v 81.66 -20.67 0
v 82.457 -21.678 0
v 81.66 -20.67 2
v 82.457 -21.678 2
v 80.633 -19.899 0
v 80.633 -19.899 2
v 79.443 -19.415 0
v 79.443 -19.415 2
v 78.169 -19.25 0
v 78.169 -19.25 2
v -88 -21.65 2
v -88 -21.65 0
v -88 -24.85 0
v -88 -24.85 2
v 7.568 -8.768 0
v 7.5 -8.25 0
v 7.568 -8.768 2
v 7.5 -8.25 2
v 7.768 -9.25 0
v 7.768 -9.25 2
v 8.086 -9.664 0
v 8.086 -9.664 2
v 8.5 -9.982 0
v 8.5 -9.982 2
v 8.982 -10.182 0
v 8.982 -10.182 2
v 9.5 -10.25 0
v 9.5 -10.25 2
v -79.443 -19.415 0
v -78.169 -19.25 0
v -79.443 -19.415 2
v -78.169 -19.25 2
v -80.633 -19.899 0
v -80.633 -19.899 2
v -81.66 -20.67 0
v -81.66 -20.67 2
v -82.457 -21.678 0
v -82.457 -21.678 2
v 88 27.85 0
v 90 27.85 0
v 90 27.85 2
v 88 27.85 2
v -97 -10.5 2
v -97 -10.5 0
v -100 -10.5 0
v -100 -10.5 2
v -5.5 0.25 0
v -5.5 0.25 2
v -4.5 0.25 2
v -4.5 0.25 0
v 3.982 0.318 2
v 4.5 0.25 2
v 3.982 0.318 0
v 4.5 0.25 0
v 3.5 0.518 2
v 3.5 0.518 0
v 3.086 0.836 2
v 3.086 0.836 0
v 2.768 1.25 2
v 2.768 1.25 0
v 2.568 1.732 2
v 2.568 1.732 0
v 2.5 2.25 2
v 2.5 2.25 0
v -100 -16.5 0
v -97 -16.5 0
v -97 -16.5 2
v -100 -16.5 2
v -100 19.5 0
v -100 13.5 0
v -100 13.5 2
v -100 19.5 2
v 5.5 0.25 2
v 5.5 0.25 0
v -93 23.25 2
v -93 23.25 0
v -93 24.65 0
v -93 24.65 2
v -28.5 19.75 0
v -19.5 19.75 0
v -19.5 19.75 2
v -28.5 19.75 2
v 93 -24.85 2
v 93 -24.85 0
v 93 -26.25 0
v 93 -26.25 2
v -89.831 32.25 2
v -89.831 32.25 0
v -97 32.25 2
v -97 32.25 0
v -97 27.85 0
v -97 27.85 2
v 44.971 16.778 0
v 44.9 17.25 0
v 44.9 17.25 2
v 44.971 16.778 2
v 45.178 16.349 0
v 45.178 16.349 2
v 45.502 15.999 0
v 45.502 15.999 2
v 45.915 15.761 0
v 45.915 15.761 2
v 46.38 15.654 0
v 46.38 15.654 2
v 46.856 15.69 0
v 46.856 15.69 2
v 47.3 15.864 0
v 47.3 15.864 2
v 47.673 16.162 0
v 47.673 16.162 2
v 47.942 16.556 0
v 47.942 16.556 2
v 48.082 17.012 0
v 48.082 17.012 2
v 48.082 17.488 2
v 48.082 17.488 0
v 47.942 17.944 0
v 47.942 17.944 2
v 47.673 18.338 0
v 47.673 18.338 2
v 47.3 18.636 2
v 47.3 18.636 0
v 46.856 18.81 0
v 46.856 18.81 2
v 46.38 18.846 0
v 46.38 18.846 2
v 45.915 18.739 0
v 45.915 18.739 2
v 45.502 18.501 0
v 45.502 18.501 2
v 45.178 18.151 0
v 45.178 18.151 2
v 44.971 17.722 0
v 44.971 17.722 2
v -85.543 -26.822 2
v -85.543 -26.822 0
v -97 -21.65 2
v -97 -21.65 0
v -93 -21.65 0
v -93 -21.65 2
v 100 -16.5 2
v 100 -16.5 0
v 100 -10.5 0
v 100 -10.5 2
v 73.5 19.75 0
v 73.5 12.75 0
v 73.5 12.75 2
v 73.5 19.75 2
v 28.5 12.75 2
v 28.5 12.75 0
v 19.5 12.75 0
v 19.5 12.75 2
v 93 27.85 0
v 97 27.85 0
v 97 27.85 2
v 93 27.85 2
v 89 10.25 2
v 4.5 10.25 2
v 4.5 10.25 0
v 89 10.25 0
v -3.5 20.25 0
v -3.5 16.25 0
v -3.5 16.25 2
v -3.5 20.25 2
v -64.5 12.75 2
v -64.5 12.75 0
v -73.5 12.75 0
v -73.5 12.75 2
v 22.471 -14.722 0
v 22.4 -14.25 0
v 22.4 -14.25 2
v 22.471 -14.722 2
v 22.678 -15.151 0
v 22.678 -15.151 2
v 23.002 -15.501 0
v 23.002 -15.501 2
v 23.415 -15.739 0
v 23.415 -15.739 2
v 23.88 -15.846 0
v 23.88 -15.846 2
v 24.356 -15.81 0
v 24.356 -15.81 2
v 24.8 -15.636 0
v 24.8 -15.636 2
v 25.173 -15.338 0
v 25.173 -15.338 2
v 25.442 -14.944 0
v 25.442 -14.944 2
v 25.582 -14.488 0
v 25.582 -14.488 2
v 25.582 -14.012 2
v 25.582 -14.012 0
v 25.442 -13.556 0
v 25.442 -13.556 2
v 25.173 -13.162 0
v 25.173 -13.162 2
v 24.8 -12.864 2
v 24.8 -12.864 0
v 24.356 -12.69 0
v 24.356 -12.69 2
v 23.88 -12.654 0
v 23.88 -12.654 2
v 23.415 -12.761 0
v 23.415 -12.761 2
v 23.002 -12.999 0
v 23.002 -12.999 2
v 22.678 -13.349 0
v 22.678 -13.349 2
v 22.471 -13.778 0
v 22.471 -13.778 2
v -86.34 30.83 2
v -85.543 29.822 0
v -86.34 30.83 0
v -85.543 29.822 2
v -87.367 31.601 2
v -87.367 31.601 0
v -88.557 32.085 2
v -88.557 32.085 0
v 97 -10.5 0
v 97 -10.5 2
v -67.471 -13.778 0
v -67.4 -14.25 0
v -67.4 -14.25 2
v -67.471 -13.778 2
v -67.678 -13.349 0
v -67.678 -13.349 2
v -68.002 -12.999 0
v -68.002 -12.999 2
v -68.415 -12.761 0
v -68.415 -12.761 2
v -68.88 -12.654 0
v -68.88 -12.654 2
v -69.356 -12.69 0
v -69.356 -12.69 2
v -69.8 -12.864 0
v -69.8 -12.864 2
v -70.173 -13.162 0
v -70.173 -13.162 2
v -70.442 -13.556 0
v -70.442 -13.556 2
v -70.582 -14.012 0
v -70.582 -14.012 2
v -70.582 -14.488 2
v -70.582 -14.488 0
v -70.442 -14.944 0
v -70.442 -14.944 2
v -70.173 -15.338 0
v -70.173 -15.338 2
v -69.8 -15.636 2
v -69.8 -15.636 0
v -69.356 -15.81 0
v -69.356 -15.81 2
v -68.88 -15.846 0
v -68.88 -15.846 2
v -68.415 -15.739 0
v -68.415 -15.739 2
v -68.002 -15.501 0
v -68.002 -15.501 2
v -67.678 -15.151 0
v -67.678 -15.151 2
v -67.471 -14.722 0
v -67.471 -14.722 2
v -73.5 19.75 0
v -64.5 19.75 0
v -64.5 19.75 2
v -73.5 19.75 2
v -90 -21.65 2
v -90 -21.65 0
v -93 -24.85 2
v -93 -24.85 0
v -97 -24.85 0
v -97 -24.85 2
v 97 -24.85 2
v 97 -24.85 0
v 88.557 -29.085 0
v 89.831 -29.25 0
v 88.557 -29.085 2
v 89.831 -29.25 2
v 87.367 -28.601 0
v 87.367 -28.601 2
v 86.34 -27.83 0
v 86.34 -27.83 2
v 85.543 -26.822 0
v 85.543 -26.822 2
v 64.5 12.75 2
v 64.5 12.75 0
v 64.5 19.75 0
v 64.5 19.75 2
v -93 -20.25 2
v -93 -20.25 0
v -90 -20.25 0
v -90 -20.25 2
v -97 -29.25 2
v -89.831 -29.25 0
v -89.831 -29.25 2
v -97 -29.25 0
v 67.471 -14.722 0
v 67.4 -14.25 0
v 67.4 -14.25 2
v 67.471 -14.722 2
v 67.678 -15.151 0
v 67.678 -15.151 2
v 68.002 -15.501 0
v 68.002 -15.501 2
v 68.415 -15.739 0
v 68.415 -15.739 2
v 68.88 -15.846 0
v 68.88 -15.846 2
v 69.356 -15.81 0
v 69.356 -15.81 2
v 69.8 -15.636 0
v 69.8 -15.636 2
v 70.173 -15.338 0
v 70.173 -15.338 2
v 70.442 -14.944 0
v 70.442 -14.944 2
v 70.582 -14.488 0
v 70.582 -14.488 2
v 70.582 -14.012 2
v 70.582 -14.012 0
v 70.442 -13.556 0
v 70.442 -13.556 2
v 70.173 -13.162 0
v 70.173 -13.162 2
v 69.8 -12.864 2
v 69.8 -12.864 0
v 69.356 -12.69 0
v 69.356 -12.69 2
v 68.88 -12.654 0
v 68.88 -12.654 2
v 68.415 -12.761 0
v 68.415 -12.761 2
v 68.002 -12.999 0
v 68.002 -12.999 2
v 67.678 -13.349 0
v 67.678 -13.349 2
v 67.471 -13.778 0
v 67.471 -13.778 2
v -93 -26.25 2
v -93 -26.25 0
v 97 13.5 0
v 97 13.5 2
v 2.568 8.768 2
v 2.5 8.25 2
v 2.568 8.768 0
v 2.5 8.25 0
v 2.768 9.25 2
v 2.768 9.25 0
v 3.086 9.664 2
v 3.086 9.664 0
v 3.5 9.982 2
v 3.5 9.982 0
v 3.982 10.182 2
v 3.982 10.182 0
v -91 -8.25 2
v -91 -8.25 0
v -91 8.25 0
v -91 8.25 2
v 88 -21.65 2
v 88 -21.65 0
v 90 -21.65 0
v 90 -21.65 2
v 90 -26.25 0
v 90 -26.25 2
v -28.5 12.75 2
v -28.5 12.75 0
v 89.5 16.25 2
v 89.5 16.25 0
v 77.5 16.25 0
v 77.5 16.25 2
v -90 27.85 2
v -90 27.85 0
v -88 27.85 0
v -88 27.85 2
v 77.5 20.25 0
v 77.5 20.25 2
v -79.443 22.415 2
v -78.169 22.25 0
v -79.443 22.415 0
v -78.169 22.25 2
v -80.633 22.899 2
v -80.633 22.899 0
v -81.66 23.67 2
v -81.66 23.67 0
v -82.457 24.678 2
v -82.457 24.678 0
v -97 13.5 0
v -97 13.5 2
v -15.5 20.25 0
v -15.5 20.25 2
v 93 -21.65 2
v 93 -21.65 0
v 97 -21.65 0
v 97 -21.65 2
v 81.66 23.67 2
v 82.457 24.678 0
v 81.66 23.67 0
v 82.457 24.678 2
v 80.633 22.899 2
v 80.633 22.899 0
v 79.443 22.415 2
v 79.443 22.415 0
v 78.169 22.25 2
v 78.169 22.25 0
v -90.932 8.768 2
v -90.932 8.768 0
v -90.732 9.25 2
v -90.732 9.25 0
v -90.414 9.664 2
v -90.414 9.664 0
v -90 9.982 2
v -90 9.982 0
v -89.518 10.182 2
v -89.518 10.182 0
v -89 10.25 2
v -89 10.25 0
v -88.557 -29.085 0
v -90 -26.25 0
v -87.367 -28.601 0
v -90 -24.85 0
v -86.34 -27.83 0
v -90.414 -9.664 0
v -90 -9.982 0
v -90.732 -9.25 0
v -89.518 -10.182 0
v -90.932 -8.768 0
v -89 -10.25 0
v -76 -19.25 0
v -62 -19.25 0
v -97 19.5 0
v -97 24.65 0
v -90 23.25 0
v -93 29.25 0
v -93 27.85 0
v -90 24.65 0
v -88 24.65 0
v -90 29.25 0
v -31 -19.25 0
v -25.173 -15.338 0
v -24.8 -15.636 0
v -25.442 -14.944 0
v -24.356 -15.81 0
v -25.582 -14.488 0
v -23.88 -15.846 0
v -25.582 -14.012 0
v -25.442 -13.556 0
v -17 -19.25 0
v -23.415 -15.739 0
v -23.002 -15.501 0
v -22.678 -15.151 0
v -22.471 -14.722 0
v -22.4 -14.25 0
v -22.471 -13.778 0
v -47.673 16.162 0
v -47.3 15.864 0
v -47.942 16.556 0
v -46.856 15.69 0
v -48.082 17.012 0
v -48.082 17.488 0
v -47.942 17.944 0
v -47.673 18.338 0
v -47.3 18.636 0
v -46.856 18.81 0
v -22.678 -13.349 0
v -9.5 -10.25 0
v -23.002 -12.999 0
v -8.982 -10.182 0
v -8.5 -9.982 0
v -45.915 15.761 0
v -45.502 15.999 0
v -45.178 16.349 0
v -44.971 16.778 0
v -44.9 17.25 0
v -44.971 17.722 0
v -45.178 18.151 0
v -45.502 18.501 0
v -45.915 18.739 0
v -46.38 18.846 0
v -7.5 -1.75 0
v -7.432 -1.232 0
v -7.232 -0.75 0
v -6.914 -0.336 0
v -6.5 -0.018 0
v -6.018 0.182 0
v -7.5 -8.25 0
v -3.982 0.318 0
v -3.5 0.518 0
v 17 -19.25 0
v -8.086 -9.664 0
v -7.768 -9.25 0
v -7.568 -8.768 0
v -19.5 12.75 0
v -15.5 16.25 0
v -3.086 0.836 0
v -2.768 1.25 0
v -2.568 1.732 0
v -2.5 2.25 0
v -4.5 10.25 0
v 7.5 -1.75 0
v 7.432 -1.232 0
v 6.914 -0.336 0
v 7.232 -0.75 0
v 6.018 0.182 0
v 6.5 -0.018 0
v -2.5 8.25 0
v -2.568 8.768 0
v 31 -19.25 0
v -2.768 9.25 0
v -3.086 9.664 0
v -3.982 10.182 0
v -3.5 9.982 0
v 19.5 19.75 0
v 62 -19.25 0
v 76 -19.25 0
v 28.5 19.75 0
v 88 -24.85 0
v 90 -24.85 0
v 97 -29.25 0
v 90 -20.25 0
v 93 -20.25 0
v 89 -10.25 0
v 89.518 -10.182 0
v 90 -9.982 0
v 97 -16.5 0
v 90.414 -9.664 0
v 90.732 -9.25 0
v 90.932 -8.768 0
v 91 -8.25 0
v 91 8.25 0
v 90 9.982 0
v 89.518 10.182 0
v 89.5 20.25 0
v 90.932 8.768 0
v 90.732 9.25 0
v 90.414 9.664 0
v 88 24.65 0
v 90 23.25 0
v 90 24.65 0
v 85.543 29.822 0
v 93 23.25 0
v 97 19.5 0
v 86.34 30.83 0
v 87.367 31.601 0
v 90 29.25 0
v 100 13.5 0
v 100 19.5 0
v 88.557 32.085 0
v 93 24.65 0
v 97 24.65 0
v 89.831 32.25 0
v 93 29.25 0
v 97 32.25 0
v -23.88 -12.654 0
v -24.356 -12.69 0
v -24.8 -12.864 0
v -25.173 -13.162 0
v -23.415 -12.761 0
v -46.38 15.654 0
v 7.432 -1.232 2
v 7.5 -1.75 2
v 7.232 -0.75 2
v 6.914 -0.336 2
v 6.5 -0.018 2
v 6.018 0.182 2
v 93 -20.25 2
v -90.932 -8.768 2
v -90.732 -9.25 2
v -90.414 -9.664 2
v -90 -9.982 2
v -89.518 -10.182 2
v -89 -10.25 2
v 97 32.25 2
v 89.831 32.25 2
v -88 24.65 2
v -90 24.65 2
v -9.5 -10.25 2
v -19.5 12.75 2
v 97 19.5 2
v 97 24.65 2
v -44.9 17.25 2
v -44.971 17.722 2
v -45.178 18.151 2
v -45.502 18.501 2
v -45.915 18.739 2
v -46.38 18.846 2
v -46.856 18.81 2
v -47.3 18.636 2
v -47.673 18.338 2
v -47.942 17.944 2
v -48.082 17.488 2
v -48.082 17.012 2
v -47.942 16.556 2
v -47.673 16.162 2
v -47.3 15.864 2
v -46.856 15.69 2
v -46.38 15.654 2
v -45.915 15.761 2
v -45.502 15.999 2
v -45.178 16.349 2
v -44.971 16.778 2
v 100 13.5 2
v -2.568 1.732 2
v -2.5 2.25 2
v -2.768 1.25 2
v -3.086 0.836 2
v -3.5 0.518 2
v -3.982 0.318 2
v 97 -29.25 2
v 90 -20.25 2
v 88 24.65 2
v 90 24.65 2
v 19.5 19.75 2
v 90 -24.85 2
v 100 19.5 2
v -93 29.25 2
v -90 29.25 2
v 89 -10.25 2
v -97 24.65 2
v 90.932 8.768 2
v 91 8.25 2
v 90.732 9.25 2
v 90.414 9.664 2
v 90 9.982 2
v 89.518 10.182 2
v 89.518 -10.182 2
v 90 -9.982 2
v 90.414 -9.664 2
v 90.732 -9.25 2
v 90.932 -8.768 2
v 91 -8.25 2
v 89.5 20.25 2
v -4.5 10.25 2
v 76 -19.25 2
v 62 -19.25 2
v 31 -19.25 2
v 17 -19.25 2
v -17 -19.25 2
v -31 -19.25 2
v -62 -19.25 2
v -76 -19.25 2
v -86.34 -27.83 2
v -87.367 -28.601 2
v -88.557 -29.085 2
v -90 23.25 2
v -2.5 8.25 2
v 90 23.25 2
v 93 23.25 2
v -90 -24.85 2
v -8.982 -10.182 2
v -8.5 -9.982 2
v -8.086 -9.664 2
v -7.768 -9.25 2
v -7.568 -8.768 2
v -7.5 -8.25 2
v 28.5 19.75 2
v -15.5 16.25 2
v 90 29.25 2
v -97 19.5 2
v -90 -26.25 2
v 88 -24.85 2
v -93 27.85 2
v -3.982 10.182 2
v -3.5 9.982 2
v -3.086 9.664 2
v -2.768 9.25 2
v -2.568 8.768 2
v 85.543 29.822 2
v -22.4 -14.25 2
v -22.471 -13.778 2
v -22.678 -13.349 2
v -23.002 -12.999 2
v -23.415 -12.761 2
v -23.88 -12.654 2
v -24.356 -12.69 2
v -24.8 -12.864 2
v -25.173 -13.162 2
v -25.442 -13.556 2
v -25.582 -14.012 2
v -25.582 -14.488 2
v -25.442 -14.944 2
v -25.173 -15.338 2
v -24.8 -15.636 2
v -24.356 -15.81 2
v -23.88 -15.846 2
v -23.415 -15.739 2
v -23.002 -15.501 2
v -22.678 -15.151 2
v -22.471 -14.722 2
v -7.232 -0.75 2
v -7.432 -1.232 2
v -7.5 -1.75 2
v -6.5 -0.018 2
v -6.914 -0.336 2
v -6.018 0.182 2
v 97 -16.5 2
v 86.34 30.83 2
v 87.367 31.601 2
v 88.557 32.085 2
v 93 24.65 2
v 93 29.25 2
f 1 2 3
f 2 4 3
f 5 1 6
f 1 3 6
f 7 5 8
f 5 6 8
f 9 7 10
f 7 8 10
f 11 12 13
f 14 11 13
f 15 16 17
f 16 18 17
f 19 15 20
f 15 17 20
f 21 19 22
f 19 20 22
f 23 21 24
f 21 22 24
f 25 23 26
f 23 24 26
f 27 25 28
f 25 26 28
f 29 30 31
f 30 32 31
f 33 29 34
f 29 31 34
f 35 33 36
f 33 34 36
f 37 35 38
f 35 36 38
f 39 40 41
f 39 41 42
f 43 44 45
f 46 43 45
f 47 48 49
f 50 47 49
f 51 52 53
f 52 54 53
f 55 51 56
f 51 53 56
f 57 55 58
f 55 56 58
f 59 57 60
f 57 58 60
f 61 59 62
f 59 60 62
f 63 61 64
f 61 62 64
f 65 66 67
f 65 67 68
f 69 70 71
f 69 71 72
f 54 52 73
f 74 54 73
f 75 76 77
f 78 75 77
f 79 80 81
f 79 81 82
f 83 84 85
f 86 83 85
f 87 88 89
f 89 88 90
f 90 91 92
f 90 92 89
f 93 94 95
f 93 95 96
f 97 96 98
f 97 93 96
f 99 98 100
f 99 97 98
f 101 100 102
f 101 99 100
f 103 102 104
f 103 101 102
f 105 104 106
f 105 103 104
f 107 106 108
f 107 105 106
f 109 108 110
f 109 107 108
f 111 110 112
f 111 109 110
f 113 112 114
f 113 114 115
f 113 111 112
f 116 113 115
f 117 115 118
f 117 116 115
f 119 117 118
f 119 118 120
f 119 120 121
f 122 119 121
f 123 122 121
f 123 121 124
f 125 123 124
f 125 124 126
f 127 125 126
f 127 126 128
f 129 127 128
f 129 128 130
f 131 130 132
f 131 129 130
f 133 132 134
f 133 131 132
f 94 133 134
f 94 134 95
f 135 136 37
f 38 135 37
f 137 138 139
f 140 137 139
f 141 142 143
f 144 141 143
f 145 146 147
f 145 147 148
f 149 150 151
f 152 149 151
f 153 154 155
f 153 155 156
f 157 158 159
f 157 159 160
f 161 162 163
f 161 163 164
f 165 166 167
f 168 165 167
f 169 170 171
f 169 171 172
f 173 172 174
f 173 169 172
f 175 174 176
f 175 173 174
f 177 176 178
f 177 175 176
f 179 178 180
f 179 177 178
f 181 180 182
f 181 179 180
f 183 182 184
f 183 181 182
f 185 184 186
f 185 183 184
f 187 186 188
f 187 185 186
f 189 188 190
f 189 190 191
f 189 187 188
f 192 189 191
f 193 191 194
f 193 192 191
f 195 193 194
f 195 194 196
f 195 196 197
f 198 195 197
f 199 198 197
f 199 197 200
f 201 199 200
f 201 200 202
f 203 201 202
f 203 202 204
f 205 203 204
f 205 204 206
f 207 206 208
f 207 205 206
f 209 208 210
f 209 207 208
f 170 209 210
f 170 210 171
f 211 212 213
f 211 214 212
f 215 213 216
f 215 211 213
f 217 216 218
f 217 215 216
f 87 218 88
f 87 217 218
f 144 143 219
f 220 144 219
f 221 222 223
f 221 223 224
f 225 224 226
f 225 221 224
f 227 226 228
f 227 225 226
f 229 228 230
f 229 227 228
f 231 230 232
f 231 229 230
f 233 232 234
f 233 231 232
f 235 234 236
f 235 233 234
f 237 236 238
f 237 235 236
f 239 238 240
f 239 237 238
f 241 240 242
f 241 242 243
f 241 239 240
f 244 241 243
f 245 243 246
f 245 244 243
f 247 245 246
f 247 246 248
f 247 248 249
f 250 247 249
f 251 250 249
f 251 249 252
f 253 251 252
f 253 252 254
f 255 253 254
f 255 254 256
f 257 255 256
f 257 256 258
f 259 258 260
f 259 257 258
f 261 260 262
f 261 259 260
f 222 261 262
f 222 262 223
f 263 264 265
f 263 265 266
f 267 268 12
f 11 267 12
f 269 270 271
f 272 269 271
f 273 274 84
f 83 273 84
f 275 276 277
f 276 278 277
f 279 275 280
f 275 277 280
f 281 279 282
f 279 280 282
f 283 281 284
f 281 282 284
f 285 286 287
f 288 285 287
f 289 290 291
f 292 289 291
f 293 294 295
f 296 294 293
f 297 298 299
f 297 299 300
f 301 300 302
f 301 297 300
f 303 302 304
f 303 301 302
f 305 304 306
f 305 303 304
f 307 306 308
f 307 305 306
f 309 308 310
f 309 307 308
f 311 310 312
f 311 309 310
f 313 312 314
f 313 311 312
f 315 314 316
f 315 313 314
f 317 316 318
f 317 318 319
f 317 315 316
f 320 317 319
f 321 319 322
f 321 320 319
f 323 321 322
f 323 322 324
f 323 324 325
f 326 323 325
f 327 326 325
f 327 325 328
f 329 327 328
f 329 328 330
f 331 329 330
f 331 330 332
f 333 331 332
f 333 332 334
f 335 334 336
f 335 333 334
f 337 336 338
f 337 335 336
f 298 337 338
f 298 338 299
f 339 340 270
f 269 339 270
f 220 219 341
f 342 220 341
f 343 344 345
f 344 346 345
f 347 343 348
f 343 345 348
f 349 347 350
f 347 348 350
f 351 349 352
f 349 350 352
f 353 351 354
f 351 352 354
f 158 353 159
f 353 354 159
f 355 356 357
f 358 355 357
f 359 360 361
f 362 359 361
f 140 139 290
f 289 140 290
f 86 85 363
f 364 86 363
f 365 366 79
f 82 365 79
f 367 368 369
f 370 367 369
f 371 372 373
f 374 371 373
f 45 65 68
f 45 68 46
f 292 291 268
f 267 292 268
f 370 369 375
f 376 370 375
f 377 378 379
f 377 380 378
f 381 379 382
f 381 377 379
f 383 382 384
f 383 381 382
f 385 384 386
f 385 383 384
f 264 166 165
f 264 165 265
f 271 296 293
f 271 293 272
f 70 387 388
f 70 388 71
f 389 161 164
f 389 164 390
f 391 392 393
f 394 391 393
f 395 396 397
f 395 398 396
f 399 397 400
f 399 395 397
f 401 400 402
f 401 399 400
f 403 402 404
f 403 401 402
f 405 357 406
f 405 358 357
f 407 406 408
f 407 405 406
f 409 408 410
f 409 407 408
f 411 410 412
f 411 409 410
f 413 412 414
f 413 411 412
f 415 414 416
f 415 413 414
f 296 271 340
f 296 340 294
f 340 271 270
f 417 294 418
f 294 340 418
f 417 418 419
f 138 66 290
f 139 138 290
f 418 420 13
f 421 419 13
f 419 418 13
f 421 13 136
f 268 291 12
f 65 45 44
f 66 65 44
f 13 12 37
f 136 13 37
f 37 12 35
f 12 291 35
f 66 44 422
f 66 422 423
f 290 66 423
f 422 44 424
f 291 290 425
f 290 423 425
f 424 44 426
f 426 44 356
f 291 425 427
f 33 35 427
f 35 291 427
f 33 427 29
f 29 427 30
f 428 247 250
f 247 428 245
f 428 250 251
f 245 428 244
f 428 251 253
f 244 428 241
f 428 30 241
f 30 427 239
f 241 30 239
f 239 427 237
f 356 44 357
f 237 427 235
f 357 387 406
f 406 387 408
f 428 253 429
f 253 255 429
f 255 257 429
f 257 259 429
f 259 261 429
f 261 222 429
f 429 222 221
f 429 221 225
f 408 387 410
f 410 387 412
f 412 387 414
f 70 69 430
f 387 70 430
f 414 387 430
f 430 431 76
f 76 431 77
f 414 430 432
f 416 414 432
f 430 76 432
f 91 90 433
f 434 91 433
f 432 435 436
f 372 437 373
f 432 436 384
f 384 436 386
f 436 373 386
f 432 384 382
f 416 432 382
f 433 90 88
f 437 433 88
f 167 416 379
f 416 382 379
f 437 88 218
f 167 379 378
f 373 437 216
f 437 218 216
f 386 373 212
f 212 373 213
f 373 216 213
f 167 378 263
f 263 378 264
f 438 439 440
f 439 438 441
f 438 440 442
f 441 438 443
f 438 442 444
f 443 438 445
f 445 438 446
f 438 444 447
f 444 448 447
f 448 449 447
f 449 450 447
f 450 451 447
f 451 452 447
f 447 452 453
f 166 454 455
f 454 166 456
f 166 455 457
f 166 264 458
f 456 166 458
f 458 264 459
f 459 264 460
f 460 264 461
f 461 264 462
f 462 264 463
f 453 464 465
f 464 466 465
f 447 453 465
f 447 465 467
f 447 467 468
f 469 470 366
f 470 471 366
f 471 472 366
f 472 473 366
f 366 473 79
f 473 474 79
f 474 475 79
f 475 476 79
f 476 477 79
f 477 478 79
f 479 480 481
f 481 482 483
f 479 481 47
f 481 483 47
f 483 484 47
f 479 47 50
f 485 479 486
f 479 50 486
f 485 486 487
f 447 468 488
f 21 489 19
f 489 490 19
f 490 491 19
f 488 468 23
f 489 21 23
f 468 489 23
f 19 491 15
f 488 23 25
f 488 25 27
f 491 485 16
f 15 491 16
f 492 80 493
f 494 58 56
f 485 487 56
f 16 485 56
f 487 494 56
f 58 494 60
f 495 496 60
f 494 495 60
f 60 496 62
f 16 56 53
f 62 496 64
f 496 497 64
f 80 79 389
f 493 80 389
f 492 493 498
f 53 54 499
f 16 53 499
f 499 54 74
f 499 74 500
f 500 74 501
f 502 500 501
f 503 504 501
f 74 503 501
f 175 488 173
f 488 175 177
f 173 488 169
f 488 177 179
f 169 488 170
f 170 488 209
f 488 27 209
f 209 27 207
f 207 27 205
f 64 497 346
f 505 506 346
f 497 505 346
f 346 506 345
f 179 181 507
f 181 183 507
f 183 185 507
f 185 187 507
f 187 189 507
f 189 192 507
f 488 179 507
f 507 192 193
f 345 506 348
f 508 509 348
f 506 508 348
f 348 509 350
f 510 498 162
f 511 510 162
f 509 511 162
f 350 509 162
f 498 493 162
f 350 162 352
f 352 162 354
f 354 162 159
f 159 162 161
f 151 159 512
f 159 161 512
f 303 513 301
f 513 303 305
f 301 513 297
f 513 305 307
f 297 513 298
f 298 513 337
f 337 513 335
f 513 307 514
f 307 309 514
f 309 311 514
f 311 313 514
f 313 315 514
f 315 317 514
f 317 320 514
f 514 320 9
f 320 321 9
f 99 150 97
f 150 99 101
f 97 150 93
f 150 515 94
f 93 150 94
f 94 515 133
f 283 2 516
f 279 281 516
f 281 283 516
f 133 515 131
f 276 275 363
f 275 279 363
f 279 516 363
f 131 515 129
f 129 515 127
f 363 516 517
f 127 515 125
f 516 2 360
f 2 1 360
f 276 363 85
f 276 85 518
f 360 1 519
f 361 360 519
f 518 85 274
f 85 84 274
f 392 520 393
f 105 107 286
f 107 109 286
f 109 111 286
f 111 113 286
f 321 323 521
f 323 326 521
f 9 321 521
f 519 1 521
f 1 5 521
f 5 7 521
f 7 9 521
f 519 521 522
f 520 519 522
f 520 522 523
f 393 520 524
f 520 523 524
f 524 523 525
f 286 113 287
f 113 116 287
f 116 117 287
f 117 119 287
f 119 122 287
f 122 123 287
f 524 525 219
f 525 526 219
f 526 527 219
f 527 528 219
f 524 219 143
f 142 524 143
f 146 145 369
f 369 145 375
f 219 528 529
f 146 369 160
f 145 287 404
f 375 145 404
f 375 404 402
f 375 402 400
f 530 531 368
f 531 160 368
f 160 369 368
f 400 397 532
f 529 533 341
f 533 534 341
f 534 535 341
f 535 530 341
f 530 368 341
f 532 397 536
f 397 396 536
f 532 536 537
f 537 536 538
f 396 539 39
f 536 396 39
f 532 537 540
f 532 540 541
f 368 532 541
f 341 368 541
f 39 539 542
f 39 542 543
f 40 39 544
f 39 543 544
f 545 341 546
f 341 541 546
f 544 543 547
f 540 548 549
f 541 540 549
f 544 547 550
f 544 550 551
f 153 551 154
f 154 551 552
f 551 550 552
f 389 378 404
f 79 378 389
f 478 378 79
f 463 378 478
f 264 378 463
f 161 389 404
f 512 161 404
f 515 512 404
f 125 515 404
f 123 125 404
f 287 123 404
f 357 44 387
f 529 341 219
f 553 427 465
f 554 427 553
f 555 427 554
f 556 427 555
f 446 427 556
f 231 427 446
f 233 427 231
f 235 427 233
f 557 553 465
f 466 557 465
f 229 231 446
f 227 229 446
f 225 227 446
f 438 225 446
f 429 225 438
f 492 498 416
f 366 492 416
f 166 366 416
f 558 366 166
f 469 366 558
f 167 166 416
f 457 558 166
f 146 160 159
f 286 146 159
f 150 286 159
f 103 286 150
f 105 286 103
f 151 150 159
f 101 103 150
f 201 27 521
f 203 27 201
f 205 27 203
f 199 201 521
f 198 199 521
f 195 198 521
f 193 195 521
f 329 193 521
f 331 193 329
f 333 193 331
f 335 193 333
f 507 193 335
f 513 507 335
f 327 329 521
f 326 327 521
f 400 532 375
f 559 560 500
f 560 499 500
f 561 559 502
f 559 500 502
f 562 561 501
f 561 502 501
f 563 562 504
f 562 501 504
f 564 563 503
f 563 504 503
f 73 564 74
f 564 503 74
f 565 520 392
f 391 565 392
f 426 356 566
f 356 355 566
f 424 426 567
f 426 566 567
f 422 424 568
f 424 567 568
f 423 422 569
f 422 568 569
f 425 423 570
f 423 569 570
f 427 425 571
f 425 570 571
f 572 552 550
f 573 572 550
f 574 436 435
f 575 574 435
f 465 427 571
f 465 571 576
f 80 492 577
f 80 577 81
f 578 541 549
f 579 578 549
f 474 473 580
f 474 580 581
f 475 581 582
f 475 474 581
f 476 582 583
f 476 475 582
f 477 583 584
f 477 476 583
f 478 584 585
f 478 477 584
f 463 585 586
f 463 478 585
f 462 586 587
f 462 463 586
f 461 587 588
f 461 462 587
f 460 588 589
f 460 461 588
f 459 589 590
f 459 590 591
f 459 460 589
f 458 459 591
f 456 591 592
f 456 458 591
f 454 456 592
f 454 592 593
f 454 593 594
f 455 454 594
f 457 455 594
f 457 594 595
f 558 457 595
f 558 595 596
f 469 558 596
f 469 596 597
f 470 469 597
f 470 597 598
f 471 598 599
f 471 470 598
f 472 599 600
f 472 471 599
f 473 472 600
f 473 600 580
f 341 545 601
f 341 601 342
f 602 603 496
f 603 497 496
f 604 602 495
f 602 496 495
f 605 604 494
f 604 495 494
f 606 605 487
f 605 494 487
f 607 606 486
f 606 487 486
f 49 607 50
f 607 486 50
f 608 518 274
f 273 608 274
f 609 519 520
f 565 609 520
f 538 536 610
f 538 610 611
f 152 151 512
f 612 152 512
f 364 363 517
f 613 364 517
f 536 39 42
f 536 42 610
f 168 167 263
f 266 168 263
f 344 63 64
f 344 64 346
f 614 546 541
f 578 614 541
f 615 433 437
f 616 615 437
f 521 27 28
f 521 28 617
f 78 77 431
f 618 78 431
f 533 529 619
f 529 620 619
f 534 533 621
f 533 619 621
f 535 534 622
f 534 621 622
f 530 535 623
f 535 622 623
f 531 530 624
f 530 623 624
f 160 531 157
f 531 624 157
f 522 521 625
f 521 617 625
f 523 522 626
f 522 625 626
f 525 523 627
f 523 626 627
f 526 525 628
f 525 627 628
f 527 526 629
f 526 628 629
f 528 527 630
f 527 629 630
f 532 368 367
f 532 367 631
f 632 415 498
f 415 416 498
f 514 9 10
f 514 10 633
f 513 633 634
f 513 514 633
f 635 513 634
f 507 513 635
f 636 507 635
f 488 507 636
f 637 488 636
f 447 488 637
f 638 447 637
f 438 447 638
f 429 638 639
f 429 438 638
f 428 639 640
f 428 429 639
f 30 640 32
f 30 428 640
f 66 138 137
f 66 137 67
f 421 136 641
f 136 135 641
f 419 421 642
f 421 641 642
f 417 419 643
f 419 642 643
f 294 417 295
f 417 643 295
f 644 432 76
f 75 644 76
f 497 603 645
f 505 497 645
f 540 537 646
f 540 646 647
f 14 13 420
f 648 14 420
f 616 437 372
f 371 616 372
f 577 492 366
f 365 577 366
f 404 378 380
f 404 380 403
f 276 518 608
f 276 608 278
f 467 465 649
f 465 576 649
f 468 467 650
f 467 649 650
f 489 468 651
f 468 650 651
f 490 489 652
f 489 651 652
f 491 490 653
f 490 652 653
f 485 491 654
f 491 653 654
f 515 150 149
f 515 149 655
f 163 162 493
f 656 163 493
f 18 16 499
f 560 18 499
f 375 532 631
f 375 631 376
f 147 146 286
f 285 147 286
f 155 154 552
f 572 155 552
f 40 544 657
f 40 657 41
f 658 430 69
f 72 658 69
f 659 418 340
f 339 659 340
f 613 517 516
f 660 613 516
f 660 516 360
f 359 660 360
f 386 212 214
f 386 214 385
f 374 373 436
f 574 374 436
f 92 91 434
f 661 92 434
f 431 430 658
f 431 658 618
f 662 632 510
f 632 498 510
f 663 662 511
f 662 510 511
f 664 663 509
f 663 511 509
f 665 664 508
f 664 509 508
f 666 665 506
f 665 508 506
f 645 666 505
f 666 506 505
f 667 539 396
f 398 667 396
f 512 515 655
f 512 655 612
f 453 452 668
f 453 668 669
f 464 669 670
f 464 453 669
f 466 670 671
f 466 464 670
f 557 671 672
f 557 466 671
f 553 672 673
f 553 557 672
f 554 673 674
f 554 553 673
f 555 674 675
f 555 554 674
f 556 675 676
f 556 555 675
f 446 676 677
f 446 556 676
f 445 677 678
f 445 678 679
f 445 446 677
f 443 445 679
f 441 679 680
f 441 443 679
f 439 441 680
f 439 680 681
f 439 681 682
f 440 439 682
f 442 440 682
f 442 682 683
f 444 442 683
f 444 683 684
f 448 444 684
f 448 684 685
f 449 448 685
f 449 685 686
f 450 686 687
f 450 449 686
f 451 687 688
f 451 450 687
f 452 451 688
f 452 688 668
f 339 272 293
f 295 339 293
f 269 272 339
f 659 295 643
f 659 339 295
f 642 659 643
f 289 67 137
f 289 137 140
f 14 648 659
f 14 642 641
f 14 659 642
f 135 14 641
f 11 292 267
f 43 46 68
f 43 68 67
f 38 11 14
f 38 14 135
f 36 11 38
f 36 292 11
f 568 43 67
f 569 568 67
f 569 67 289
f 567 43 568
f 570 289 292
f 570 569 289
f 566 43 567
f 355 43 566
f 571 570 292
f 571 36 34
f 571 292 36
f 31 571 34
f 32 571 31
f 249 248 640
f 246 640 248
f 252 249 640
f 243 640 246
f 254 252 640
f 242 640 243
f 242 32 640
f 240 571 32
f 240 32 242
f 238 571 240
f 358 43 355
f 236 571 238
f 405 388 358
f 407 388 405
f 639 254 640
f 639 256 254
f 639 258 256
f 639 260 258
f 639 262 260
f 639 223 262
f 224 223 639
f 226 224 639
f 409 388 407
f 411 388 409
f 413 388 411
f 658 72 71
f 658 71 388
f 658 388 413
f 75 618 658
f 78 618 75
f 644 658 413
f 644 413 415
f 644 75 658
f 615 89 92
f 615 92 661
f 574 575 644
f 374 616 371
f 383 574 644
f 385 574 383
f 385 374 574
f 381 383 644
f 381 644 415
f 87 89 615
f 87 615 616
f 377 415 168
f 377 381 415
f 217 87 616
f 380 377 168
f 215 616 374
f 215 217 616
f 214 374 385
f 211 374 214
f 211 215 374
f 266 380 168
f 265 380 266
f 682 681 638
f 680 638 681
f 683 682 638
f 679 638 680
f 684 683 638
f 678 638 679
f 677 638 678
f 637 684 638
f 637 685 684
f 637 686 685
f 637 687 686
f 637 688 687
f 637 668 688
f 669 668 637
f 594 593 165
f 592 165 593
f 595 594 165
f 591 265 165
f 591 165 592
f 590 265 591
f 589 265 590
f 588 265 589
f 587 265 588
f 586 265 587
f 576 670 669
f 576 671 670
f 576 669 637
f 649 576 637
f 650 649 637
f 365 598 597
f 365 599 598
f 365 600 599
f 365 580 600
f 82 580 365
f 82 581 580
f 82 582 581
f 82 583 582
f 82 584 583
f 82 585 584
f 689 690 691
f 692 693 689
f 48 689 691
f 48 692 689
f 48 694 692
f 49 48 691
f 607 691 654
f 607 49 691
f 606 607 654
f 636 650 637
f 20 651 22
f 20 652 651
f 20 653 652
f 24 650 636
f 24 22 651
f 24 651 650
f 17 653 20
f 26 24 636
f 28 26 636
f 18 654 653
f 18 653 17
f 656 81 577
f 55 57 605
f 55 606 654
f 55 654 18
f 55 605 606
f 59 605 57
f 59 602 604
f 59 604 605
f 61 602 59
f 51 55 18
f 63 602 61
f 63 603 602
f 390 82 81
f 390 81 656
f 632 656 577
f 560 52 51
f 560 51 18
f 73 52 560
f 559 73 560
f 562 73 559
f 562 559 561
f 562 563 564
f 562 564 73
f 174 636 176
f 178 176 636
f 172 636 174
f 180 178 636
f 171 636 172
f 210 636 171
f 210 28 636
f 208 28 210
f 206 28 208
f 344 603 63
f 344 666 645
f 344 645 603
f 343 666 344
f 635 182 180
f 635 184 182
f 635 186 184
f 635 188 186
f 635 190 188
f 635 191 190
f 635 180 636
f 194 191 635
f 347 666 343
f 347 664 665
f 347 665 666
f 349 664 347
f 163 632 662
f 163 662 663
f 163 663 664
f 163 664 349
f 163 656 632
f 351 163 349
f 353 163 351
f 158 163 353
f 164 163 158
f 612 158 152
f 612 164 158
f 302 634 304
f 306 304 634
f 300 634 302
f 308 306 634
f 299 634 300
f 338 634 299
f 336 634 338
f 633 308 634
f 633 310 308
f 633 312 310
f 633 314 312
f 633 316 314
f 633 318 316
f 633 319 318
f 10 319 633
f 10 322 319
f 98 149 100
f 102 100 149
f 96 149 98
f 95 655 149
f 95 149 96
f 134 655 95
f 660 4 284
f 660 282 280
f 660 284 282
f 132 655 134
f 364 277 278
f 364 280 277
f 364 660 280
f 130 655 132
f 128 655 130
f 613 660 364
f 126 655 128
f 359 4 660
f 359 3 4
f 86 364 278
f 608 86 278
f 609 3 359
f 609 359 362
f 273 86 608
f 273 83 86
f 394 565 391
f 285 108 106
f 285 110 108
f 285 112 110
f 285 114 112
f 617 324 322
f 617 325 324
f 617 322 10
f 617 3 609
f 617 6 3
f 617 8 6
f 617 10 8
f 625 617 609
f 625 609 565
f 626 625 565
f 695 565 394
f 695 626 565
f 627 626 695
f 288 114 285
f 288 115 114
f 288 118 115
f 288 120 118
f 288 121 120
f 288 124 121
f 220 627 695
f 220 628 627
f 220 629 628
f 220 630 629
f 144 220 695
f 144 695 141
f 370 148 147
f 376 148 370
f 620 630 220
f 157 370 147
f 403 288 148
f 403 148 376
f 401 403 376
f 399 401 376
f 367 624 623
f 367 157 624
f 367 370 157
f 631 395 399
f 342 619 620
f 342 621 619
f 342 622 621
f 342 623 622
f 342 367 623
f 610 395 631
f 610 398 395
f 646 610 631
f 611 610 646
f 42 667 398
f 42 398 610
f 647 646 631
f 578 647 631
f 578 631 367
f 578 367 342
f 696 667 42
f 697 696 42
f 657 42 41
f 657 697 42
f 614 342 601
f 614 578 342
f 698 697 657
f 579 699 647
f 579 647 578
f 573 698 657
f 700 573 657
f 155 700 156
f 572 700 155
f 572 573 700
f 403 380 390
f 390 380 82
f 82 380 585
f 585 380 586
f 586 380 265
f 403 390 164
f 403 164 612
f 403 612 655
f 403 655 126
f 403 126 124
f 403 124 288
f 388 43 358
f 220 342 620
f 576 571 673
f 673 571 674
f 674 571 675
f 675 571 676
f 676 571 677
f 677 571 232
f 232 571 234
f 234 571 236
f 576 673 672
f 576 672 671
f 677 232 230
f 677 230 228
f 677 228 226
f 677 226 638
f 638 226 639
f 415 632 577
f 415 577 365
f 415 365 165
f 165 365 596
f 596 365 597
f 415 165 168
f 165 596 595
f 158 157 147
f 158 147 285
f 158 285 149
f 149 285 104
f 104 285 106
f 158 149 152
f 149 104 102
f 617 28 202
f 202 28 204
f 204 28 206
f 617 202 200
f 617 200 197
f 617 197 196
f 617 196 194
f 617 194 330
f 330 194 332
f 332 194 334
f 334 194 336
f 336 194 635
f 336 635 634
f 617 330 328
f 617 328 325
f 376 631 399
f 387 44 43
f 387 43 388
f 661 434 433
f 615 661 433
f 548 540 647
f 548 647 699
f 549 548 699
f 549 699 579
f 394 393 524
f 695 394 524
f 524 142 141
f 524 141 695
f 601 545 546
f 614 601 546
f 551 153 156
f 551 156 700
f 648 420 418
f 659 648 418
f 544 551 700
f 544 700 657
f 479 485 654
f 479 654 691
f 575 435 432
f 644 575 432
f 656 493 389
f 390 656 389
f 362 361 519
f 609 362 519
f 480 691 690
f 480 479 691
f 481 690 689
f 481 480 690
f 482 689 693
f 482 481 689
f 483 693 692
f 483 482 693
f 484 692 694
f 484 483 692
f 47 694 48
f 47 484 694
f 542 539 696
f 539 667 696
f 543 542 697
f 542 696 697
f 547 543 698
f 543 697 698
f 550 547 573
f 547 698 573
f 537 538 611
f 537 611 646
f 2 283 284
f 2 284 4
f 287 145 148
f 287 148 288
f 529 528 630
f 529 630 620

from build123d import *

# Parameters (mm, degrees)
SKETCH_1_R          = 1.6
SKETCH_1_W          = 83.5
SKETCH_1_H          = 20.5
EXTRUDE_1_DEPTH     = 2
SKETCH_3_W          = 5
SKETCH_3_H          = 10
CUT_EXTRUDE_2_DEPTH = 101.127730924
SKETCH_4_W          = 9
SKETCH_4_H          = 7
SKETCH_4_W_2        = 23
SKETCH_4_H_2        = 5.5
SKETCH_4_W_3        = 38
CUT_EXTRUDE_3_DEPTH = 101.127730924
SKETCH_5_W          = 12
SKETCH_5_H          = 4
CUT_EXTRUDE_4_DEPTH = 101.127730924
FILLET_8_R          = 2
FILLET_9_R          = 2
SKETCH_7_W          = 10
SKETCH_7_H          = 10
EXTRUDE_3_DEPTH     = 2
SKETCH_9_W          = 162.568913239
SKETCH_9_H          = 21.283892233
CUT_EXTRUDE_5_DEPTH = 103.240219581
SKETCH_8_W          = 3
SKETCH_8_H          = 6
EXTRUDE_4_DEPTH     = 2
CUT_EXTRUDE_6_DEPTH = 106.090734606
FILLET_10_R         = 5


with BuildPart() as part:
    # 草图1 → 凸台-拉伸1 (new body)
    with BuildSketch(Plane.XY):
        Polygon((64, -19.25), (29, -19.25), (29, -24.75), (-29, -24.75), (-29, -19.25), (-64, -19.25), (-64, -24.75), (-97, -24.75), (-97, 22.25), (97, 22.25), (97, -24.75), (64, -24.75), align=None)
        with Locations((-46.5, 17.25)):
            Circle(SKETCH_1_R, mode=Mode.SUBTRACT)
        with Locations((-69, -14.25)):
            Circle(SKETCH_1_R, mode=Mode.SUBTRACT)
        with Locations((-24, -14.25)):
            Circle(SKETCH_1_R, mode=Mode.SUBTRACT)
        with Locations(Location((69, -14.25, 0), (0, 0, 180))):
            Circle(SKETCH_1_R, mode=Mode.SUBTRACT)
        with Locations(Location((46.5, 17.25, 0), (0, 0, 180))):
            Circle(SKETCH_1_R, mode=Mode.SUBTRACT)
        with Locations(Location((24, -14.25, 0), (0, 0, 180))):
            Circle(SKETCH_1_R, mode=Mode.SUBTRACT)
        with Locations((-69, -21.75)):
            Circle(SKETCH_1_R, mode=Mode.SUBTRACT)
        with Locations((-24, -21.75)):
            Circle(SKETCH_1_R, mode=Mode.SUBTRACT)
        with Locations((24, -21.75)):
            Circle(SKETCH_1_R, mode=Mode.SUBTRACT)
        with Locations((69, -21.75)):
            Circle(SKETCH_1_R, mode=Mode.SUBTRACT)
        with Locations((-49.25, 0)):
            Rectangle(SKETCH_1_W, SKETCH_1_H, mode=Mode.SUBTRACT)
        with Locations((49.25, 0)):
            Rectangle(SKETCH_1_W, SKETCH_1_H, mode=Mode.SUBTRACT)
    extrude(amount=EXTRUDE_1_DEPTH)

    # 草图3 → 切除-拉伸2 (cut, through all)
    with BuildSketch(Plane.XY.offset(2)):
        with Locations((-5, 5.25)):
            Rectangle(SKETCH_3_W, SKETCH_3_H)
        with Locations((5, 5.25)):
            Rectangle(SKETCH_3_W, SKETCH_3_H)
    extrude(amount=-CUT_EXTRUDE_2_DEPTH, mode=Mode.SUBTRACT)

    # 草图4 → 切除-拉伸3 (cut, through all)
    with BuildSketch(Plane(origin=(0, 0, 0), x_dir=(-1, 0, 0), z_dir=(0, 0, -1))):
        with Locations((-69, 16.25)):
            Rectangle(SKETCH_4_W, SKETCH_4_H)
        with Locations((-24, 16.25)):
            Rectangle(SKETCH_4_W, SKETCH_4_H)
        with Locations((24, 16.25)):
            Rectangle(SKETCH_4_W, SKETCH_4_H)
        with Locations((69, 16.25)):
            Rectangle(SKETCH_4_W, SKETCH_4_H)
        with Locations((-85.5, -22)):
            Rectangle(SKETCH_4_W_2, SKETCH_4_H_2)
        with Locations((85.5, -22)):
            Rectangle(SKETCH_4_W_2, SKETCH_4_H_2)
        with Locations((0, -22)):
            Rectangle(SKETCH_4_W_3, SKETCH_4_H_2)
    extrude(amount=-CUT_EXTRUDE_3_DEPTH, mode=Mode.SUBTRACT)

    # 草图5 → 切除-拉伸4 (cut, through all)
    with BuildSketch(Plane(origin=(0, 0, 0), x_dir=(-1, 0, 0), z_dir=(0, 0, -1))):
        with Locations((-83.5, 18.25)):
            Rectangle(SKETCH_5_W, SKETCH_5_H)
        with Locations((9.5, 18.25)):
            Rectangle(SKETCH_5_W, SKETCH_5_H)
    extrude(amount=-CUT_EXTRUDE_4_DEPTH, mode=Mode.SUBTRACT)

    # 圆角8
    fillet_8_edges = [part.edges().sort_by_distance(p)[0] for p in [
        (-7.5, 0.25, 1),
        (-2.5, 10.25, 1),
        (-2.5, 0.25, 1),
        (7.5, 0.25, 1),
        (2.5, 0.25, 1),
        (2.5, 10.25, 1),
        (-91, 10.25, 1),
        (-91, -10.25, 1),
        (-7.5, -10.25, 1),
        (7.5, -10.25, 1),
        (91, -10.25, 1),
        (91, 10.25, 1),
    ]]
    fillet(fillet_8_edges, radius=FILLET_8_R)

    # 圆角9
    fillet_9_edges = [part.edges().sort_by_distance(p)[0] for p in [
        (74, -19.25, 1),
        (74, -24.75, 1),
        (-74, -24.75, 1),
        (-74, -19.25, 1),
        (19, -24.75, 1),
        (19, -19.25, 1),
        (64, -24.75, 1),
        (-19, -19.25, 1),
        (-19, -24.75, 1),
        (64, -19.25, 1),
        (29, -19.25, 1),
        (29, -24.75, 1),
        (-29, -24.75, 1),
        (-29, -19.25, 1),
        (-64, -19.25, 1),
        (-64, -24.75, 1),
    ]]
    fillet(fillet_9_edges, radius=FILLET_9_R)

    # 草图7 → 凸台-拉伸3 (add)
    with BuildSketch(Plane(origin=(0, 0, 0), x_dir=(-1, 0, 0), z_dir=(0, 0, -1))):
        with Locations((-92, 27.25)):
            Rectangle(SKETCH_7_W, SKETCH_7_H)
        with Locations((-92, -24.25)):
            Rectangle(SKETCH_7_W, SKETCH_7_H)
        with Locations((92, 27.25)):
            Rectangle(SKETCH_7_W, SKETCH_7_H)
        with Locations((92, -24.25)):
            Rectangle(SKETCH_7_W, SKETCH_7_H)
    extrude(amount=-EXTRUDE_3_DEPTH)

    # 草图9 → 切除-拉伸5 (cut, through all)
    with BuildSketch(Plane(origin=(0, 0, 0), x_dir=(-1, 0, 0), z_dir=(0, 0, -1))):
        with Locations((0.619782194, -29.891946117)):
            Rectangle(SKETCH_9_W, SKETCH_9_H)
    extrude(amount=-CUT_EXTRUDE_5_DEPTH, mode=Mode.SUBTRACT)

    # 草图8 → 凸台-拉伸4 (add)
    with BuildSketch(Plane(origin=(0, 0, 0), x_dir=(-1, 0, 0), z_dir=(0, 0, -1))):
        Polygon((-87, 32.25), (-81, 22.25), (-87, 22.25), align=None)
        Polygon((87, 32.25), (81, 22.25), (87, 22.25), align=None)
        Polygon((-87, -29.25), (-81, -19.25), (-87, -19.25), align=None)
        Polygon((87, -29.25), (81, -19.25), (87, -19.25), align=None)
        with Locations((-98.5, 16.5)):
            Rectangle(SKETCH_8_W, SKETCH_8_H)
        with Locations((-98.5, -13.5)):
            Rectangle(SKETCH_8_W, SKETCH_8_H)
        with Locations((98.5, -13.5)):
            Rectangle(SKETCH_8_W, SKETCH_8_H)
        with Locations((98.5, 16.5)):
            Rectangle(SKETCH_8_W, SKETCH_8_H)
    extrude(amount=-EXTRUDE_4_DEPTH)

    # 草图10 → 切除-拉伸6 (cut, through all)
    with BuildSketch(Plane(origin=(0, 0, 0), x_dir=(-1, 0, 0), z_dir=(0, 0, -1))):
        Polygon((-97, 27.85), (-93, 27.85), (-93, 29.25), (-90, 29.25), (-90, 27.85), (-88, 27.85), (-88, 24.65), (-90, 24.65), (-90, 23.25), (-93, 23.25), (-93, 24.65), (-97, 24.65), align=None)
        Polygon((-97, -24.85), (-93, -24.85), (-93, -26.25), (-90, -26.25), (-90, -24.85), (-88, -24.85), (-88, -21.65), (-90, -21.65), (-90, -20.25), (-93, -20.25), (-93, -21.65), (-97, -21.65), align=None)
        Polygon((97, -24.85), (97, -21.65), (93, -21.65), (93, -20.25), (90, -20.25), (90, -21.65), (88, -21.65), (88, -24.85), (90, -24.85), (90, -26.25), (93, -26.25), (93, -24.85), align=None)
        Polygon((97, 27.85), (93, 27.85), (93, 29.25), (90, 29.25), (90, 27.85), (88, 27.85), (88, 24.65), (90, 24.65), (90, 23.25), (93, 23.25), (93, 24.65), (97, 24.65), align=None)
    extrude(amount=-CUT_EXTRUDE_6_DEPTH, mode=Mode.SUBTRACT)

    # 圆角10
    fillet_10_edges = [part.edges().sort_by_distance(p)[0] for p in [
        (87, 32.25, 1),
        (87, -29.25, 1),
        (-87, 32.25, 1),
        (-87, -29.25, 1),
        (81, 22.25, 1),
        (-81, 22.25, 1),
        (81, -19.25, 1),
        (-81, -19.25, 1),
    ]]
    fillet(fillet_10_edges, radius=FILLET_10_R)


solid = part.part
